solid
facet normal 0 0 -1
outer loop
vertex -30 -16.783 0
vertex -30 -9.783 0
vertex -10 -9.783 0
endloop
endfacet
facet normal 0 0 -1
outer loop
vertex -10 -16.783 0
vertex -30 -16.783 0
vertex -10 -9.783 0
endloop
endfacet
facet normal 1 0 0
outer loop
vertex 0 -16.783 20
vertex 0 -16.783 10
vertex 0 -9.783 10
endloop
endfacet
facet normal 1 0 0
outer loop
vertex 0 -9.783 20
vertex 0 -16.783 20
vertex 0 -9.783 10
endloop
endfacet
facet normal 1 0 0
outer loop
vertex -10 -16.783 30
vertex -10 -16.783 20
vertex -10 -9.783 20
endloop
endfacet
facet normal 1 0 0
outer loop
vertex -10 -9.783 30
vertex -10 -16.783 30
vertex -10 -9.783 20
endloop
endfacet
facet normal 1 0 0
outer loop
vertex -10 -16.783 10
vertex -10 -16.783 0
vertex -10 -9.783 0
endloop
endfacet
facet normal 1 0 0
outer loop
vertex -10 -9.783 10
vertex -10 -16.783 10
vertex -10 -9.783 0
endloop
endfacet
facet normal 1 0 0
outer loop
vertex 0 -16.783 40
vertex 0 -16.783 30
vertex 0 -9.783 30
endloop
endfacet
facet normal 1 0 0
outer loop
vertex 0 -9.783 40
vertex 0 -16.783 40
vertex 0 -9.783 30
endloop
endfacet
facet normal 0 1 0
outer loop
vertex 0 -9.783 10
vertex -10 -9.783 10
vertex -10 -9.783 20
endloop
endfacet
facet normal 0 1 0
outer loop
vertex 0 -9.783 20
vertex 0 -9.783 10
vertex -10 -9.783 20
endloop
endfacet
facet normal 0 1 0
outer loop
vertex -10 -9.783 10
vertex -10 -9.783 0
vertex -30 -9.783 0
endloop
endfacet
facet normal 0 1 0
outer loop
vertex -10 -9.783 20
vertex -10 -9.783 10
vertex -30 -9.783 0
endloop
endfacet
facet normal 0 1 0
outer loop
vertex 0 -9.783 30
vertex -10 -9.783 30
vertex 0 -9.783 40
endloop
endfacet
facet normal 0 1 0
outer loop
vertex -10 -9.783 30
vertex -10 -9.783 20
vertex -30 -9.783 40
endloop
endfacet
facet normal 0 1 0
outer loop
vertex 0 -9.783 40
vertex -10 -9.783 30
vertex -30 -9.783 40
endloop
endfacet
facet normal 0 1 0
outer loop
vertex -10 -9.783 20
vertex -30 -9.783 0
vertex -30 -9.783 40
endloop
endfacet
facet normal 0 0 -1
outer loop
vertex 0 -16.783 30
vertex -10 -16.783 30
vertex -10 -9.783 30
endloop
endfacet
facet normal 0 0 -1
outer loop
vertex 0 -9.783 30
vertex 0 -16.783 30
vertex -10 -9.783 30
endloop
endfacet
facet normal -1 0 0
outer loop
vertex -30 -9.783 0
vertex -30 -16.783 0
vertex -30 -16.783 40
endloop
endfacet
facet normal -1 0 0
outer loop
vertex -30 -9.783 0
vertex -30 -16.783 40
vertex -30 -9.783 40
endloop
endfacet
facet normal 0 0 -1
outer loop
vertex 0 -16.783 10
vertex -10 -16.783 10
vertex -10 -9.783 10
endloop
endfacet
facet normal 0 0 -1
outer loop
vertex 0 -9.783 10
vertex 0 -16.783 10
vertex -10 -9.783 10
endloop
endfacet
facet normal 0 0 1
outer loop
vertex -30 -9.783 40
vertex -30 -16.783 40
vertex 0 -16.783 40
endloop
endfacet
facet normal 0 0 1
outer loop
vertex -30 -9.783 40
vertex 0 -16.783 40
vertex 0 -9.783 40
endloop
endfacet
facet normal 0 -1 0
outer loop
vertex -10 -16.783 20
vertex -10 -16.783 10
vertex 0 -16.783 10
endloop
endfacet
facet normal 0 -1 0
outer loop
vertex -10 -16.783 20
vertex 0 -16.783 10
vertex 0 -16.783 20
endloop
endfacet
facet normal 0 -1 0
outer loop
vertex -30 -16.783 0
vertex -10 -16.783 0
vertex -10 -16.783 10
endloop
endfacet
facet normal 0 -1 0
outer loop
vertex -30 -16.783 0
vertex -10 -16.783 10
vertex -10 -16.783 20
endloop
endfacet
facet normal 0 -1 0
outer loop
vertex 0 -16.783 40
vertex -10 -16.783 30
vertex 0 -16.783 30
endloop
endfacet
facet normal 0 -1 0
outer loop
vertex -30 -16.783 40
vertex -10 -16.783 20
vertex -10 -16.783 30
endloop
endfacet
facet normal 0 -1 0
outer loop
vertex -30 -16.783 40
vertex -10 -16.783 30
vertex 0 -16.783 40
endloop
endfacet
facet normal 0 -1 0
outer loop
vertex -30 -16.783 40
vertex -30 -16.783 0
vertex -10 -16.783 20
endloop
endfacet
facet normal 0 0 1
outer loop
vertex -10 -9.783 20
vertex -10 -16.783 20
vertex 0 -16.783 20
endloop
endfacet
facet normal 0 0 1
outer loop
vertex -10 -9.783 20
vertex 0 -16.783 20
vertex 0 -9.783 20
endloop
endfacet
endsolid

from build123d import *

# Parameters (mm, degrees)
F0_W     = 20
F0_H     = 7
F1_DEPTH = 40
F2_W     = 7
F2_H     = 10
F3_DEPTH = 10


with BuildPart() as f1:
    # F0 (on Top) → F1 (new body)
    with BuildSketch(Plane.XY):
        with Locations((-20, -13.28286)):
            Rectangle(F0_W, F0_H)
    extrude(amount=F1_DEPTH)

    # F2 (on face) → F3 (join)
    with BuildSketch(Plane.YZ.offset(-10)):
        with Locations((-13.28286, 35)):
            Rectangle(F2_W, F2_H)
        with Locations((-13.28286, 15)):
            Rectangle(F2_W, F2_H)
    extrude(amount=F3_DEPTH)


solid = f1.part
